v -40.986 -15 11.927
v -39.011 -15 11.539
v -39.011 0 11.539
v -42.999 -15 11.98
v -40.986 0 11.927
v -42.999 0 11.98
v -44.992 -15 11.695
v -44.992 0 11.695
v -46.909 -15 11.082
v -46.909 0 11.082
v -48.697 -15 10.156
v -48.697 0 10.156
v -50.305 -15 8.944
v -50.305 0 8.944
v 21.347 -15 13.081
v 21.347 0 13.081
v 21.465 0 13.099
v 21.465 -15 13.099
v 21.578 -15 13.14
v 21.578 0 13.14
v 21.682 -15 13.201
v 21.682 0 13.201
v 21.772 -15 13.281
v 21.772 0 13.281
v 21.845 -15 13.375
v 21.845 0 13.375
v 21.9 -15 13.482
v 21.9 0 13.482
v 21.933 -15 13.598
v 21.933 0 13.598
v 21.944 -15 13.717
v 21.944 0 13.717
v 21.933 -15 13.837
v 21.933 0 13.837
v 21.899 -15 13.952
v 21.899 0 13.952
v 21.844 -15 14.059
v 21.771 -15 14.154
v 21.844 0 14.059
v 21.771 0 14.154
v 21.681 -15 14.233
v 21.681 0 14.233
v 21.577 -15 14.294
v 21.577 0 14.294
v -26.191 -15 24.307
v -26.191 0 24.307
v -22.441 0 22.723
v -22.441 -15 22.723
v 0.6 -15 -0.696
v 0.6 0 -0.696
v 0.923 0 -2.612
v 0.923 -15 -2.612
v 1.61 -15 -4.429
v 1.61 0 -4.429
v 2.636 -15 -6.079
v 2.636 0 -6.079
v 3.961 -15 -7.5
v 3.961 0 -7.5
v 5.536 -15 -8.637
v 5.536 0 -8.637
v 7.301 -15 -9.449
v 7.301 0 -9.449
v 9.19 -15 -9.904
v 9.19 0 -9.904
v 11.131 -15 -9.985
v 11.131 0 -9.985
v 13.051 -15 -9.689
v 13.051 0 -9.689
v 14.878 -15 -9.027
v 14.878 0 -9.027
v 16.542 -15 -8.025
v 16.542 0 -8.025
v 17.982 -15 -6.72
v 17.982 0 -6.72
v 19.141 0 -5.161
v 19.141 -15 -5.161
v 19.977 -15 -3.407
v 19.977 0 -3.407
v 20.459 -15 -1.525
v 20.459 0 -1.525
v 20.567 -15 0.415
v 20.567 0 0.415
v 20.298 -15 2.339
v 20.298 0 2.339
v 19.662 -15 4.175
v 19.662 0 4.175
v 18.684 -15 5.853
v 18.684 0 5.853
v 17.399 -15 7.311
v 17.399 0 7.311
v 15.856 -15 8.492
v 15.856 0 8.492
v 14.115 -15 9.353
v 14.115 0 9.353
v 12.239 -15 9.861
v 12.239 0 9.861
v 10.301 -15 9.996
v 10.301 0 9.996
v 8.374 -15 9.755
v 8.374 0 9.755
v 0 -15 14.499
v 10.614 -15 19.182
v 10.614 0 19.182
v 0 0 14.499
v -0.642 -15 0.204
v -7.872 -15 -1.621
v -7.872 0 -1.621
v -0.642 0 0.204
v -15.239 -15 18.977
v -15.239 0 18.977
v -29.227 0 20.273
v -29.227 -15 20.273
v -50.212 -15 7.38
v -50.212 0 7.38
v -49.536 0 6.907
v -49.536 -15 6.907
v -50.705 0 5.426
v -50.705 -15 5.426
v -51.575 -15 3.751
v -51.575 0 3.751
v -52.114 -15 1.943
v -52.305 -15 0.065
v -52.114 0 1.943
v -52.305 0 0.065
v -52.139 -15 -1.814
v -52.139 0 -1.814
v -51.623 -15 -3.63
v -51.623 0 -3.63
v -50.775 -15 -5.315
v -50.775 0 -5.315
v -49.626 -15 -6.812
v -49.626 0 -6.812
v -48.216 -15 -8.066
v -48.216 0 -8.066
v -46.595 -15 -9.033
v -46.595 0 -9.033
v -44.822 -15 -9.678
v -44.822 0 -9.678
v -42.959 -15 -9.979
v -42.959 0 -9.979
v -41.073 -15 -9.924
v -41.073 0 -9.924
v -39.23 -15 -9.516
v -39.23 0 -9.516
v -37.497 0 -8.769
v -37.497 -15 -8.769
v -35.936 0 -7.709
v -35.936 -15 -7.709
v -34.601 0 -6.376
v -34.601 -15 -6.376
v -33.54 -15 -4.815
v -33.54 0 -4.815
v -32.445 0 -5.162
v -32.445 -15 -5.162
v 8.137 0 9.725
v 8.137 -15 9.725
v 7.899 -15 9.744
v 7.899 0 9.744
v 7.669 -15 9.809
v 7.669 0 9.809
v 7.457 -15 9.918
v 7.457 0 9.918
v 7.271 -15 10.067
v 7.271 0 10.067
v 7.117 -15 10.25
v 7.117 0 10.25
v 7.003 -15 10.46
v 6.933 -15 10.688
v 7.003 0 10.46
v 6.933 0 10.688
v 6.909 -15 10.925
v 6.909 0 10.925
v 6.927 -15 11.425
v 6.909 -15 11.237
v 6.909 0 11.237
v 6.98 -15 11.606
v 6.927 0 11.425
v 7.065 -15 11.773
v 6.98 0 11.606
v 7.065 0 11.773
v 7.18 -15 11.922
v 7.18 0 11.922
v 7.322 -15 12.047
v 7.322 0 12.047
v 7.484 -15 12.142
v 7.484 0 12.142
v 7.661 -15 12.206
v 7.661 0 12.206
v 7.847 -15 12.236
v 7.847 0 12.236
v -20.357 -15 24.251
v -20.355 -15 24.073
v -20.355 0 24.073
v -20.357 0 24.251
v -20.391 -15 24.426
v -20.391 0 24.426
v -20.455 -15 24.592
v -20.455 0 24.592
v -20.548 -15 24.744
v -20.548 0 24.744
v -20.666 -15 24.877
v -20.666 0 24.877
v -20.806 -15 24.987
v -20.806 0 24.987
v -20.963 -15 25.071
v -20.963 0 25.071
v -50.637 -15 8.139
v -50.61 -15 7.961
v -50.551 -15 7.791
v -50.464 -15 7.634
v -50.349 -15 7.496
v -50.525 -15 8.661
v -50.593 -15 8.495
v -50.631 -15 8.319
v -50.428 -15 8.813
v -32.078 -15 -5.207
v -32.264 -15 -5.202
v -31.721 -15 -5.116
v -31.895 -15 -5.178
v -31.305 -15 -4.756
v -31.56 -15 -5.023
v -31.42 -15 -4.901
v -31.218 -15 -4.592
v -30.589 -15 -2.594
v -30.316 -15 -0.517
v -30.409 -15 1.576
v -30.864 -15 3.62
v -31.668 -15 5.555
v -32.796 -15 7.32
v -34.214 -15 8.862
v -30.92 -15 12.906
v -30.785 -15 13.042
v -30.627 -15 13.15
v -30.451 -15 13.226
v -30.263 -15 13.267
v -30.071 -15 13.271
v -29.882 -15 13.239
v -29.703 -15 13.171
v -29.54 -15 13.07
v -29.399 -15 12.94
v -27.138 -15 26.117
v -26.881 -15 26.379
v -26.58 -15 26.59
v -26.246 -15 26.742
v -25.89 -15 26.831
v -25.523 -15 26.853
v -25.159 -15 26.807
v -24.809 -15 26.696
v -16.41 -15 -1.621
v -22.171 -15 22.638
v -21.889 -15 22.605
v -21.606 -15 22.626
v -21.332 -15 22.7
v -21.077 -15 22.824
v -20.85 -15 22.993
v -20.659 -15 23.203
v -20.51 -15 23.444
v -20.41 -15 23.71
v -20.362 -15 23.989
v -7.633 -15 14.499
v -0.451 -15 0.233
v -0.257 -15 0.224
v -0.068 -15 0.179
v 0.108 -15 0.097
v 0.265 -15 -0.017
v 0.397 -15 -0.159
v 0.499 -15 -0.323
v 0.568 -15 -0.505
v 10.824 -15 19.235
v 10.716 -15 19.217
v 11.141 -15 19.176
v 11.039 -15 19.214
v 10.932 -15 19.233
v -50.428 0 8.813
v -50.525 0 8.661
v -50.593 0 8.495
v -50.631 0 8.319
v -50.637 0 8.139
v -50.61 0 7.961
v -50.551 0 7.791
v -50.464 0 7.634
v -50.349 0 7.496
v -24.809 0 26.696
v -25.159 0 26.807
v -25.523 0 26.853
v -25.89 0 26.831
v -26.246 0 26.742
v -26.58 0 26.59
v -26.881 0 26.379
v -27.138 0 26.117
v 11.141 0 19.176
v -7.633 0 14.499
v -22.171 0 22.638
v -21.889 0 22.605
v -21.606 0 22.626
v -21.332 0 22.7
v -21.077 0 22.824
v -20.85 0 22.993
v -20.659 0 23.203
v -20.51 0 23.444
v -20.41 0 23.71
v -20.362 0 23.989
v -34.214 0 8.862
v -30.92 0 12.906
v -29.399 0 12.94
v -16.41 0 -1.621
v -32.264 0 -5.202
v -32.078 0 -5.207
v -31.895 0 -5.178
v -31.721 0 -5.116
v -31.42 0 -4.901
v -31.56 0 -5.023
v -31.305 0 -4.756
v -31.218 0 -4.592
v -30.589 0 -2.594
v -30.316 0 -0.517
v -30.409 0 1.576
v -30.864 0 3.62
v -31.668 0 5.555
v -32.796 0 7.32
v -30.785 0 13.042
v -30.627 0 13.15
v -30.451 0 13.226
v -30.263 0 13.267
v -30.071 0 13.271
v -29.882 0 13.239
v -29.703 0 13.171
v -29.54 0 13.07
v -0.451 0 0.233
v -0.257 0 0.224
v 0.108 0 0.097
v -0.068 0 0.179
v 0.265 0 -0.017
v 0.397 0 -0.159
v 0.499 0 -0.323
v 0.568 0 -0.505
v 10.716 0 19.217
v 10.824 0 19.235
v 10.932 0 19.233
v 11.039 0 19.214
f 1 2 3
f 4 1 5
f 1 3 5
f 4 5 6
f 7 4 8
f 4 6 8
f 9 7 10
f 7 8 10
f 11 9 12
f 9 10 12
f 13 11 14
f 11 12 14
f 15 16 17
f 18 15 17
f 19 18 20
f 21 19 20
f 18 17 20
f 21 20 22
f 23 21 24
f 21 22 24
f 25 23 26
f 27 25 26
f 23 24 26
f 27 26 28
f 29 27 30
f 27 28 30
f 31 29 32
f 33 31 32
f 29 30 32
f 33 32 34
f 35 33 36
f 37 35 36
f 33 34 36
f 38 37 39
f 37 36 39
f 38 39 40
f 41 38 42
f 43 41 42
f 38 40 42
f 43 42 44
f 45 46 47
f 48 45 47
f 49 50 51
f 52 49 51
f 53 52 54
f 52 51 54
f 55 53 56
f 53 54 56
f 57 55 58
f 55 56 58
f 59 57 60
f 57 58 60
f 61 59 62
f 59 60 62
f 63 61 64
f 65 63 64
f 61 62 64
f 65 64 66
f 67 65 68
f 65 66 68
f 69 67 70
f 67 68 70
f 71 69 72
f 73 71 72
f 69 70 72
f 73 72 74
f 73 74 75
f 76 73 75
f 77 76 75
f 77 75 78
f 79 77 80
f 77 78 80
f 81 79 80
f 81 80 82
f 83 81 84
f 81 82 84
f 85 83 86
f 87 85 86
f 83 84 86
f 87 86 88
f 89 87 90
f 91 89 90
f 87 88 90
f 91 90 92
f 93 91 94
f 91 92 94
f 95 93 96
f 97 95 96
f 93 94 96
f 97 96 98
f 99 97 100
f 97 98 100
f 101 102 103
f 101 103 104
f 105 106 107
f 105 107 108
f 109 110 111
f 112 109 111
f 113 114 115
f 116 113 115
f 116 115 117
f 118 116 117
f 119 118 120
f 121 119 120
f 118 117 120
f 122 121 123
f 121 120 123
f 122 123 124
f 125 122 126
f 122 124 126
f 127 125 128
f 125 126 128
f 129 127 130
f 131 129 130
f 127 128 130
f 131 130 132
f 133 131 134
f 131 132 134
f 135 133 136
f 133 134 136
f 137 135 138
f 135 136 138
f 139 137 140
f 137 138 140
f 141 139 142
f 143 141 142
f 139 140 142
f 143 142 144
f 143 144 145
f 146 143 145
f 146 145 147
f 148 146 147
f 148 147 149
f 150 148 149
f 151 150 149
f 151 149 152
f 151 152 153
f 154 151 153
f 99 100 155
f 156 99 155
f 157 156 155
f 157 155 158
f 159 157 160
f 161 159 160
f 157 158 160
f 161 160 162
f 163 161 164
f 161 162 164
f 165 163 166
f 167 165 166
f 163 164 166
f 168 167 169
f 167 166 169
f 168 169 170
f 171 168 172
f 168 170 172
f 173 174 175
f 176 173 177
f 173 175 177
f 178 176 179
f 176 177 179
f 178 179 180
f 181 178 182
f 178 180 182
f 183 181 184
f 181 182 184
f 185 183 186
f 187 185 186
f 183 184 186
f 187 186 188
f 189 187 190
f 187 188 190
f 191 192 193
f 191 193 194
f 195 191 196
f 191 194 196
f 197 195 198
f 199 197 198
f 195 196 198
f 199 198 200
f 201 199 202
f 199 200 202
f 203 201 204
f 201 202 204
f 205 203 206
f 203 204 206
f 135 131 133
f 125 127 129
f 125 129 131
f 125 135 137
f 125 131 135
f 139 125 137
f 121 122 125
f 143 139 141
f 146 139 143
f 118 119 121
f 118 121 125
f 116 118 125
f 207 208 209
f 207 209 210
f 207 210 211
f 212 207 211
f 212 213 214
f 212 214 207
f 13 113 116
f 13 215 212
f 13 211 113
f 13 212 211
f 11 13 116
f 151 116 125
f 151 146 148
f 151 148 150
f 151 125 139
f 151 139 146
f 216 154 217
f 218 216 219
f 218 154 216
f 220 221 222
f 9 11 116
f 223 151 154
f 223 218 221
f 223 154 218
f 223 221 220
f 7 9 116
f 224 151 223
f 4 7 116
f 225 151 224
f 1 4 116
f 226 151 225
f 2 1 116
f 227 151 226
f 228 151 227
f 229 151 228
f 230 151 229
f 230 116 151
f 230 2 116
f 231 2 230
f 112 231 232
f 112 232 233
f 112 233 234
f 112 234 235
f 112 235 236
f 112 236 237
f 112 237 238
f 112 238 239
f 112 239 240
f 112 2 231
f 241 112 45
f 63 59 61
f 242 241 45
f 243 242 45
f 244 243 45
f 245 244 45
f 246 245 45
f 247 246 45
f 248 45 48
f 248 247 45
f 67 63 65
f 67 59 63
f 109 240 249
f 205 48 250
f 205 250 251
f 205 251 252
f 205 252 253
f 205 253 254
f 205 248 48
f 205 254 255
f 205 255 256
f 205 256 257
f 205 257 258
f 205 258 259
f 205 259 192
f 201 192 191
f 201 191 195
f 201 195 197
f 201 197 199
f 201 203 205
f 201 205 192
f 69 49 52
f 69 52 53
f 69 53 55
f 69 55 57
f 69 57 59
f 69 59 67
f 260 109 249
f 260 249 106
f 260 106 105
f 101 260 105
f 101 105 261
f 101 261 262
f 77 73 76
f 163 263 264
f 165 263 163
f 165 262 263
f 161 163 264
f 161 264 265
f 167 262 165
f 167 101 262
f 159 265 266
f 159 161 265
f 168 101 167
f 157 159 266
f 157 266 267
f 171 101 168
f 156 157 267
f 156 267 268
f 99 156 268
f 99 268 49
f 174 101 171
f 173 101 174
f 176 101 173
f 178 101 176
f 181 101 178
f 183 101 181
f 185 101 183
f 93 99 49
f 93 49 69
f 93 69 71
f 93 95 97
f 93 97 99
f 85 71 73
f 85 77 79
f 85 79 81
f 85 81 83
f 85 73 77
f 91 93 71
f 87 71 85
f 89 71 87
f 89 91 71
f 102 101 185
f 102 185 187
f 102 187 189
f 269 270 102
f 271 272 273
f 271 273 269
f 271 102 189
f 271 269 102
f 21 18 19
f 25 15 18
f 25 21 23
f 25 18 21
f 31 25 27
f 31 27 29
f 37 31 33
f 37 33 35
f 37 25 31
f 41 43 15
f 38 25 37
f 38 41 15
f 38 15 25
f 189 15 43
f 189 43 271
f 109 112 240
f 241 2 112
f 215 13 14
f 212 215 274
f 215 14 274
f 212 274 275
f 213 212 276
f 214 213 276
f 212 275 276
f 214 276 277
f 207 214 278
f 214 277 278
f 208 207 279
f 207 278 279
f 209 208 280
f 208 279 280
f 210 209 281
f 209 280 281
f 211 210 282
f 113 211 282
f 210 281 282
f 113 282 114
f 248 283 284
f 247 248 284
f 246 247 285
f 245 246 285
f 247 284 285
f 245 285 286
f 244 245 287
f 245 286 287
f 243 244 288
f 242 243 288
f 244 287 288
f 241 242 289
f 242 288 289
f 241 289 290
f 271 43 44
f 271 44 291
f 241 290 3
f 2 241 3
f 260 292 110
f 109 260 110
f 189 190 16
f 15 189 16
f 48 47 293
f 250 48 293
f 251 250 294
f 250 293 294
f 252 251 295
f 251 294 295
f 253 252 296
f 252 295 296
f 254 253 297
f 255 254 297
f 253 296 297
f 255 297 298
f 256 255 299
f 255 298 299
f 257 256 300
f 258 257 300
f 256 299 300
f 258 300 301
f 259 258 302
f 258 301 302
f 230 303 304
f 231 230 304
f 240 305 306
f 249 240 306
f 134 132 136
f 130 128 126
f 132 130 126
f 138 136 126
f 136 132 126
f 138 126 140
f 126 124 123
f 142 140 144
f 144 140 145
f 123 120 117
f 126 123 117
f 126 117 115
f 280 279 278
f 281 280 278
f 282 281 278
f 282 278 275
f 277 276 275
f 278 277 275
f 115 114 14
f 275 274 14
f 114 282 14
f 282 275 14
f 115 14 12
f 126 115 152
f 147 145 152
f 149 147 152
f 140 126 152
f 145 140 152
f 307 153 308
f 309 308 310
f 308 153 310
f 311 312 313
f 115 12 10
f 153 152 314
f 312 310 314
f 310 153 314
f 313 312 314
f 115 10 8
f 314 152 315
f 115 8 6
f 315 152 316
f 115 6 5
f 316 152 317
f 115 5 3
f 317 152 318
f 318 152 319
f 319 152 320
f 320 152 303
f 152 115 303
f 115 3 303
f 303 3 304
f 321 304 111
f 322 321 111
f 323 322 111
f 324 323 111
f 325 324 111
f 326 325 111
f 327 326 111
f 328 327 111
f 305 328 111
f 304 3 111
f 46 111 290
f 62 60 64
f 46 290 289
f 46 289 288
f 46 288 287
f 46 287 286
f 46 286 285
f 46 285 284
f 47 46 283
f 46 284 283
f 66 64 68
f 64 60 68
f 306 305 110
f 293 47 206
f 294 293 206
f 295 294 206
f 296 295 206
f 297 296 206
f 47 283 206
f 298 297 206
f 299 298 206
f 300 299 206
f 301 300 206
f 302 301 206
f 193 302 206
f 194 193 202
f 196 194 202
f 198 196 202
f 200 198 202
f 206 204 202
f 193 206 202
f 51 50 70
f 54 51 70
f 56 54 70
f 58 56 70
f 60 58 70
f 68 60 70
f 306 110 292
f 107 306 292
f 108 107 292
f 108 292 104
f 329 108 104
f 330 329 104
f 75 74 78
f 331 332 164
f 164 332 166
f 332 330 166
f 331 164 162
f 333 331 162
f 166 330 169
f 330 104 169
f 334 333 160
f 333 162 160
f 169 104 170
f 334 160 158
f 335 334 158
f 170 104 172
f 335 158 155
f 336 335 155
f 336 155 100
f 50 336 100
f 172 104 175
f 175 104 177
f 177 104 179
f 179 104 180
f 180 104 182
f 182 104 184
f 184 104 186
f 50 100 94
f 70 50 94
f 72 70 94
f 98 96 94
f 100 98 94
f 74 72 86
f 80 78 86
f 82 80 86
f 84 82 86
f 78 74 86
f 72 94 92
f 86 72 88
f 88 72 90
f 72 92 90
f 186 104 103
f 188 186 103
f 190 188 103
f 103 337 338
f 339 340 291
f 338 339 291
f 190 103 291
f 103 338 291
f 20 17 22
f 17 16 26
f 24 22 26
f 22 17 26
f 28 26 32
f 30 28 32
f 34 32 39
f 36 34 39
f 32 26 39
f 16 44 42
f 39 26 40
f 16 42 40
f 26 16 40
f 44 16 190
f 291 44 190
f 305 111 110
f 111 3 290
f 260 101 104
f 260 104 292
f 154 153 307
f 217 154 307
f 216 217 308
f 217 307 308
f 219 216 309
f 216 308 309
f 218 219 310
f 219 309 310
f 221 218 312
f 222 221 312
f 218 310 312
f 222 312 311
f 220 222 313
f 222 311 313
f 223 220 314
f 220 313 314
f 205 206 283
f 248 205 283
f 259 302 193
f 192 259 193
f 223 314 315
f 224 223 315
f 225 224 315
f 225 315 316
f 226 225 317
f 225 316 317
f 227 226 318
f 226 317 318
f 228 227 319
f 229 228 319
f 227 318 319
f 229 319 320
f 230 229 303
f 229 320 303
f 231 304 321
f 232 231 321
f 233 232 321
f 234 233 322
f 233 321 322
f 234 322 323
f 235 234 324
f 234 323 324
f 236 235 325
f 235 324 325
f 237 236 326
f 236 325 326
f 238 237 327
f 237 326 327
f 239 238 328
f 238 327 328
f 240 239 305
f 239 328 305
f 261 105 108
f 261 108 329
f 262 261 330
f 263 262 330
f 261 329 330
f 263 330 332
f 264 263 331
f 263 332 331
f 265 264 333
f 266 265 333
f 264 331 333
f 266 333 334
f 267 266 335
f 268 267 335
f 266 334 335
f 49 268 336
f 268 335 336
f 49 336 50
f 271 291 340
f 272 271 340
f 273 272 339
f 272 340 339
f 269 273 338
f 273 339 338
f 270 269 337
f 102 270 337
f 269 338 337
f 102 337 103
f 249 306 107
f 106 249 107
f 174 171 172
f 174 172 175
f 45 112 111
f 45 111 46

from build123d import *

# Parameters (mm, degrees)
F1_DEPTH = 15


with BuildPart() as f1:
    # F0 (on Front) → F1 (new body)
    with BuildSketch(Plane.XZ):
        with BuildLine():
            Line((-50.211565, 7.379583), (-49.536289, 6.907117))
            ThreePointArc((-49.536289, 6.907117), (-48.215818, -8.066107), (-33.540352, -4.814682))
            Line((-33.540352, -4.814682), (-32.444857, -5.16249))
            ThreePointArc((-32.444857, -5.16249), (-31.720531, -5.116098), (-31.218368, -4.592044))
            ThreePointArc((-31.218368, -4.592044), (-30.591796, 2.607902), (-34.213844, 8.861907))
            Line((-34.213844, 8.861907), (-30.920298, 12.905683))
            ThreePointArc((-30.920298, 12.905683), (-30.167371, 13.273918), (-29.398681, 12.939833))
            Line((-29.398681, 12.939833), (-16.410195, -1.621093))
            Line((-16.410195, -1.621093), (-7.871556, -1.621093))
            Line((-7.871556, -1.621093), (-0.642441, 0.20388))
            ThreePointArc((-0.642441, 0.20388), (0.188985, 0.044133), (0.599902, -0.696093))
            ThreePointArc((0.599902, -0.696093), (18.599287, -5.968348), (8.373546, 9.754525))
            ThreePointArc((8.373546, 9.754525), (7.359995, 9.987757), (6.909294, 10.925068))
            Line((6.909294, 10.925068), (6.909294, 11.237489))
            ThreePointArc((6.909294, 11.237489), (7.180434, 11.922151), (7.846819, 12.235535))
            Line((7.846819, 12.235535), (21.346842, 13.080605))
            ThreePointArc((21.346842, 13.080605), (21.933025, 13.597725), (21.577048, 14.293644))
            Line((21.577048, 14.293644), (11.140821, 19.176345))
            ThreePointArc((11.140821, 19.176345), (10.877845, 19.236347), (10.613608, 19.182167))
            Line((10.613608, 19.182167), (0, 14.499336))
            Line((0, 14.499336), (-7.632633, 14.499336))
            Line((-7.632633, 14.499336), (-15.239003, 18.976845))
            Line((-15.239003, 18.976845), (-29.227387, 20.273161))
            Line((-29.227387, 20.273161), (-26.190706, 24.307124))
            Line((-26.190706, 24.307124), (-22.441075, 22.722935))
            ThreePointArc((-22.441075, 22.722935), (-21.077169, 22.823507), (-20.361762, 23.989073))
            Line((-20.361762, 23.989073), (-20.355286, 24.072853))
            ThreePointArc((-20.355286, 24.072853), (-20.498198, 24.670009), (-20.963128, 25.071082))
            Line((-20.963128, 25.071082), (-24.808915, 26.695896))
            ThreePointArc((-24.808915, 26.695896), (-26.070014, 26.794443), (-27.13801, 26.116602))
            Line((-27.13801, 26.116602), (-39.011024, 11.539056))
            ThreePointArc((-39.011024, 11.539056), (-44.991956, 11.695307), (-50.304952, 8.944303))
            ThreePointArc((-50.304952, 8.944303), (-50.636512, 8.139368), (-50.211565, 7.379583))
        make_face()
    extrude(amount=F1_DEPTH)


solid = f1.part
